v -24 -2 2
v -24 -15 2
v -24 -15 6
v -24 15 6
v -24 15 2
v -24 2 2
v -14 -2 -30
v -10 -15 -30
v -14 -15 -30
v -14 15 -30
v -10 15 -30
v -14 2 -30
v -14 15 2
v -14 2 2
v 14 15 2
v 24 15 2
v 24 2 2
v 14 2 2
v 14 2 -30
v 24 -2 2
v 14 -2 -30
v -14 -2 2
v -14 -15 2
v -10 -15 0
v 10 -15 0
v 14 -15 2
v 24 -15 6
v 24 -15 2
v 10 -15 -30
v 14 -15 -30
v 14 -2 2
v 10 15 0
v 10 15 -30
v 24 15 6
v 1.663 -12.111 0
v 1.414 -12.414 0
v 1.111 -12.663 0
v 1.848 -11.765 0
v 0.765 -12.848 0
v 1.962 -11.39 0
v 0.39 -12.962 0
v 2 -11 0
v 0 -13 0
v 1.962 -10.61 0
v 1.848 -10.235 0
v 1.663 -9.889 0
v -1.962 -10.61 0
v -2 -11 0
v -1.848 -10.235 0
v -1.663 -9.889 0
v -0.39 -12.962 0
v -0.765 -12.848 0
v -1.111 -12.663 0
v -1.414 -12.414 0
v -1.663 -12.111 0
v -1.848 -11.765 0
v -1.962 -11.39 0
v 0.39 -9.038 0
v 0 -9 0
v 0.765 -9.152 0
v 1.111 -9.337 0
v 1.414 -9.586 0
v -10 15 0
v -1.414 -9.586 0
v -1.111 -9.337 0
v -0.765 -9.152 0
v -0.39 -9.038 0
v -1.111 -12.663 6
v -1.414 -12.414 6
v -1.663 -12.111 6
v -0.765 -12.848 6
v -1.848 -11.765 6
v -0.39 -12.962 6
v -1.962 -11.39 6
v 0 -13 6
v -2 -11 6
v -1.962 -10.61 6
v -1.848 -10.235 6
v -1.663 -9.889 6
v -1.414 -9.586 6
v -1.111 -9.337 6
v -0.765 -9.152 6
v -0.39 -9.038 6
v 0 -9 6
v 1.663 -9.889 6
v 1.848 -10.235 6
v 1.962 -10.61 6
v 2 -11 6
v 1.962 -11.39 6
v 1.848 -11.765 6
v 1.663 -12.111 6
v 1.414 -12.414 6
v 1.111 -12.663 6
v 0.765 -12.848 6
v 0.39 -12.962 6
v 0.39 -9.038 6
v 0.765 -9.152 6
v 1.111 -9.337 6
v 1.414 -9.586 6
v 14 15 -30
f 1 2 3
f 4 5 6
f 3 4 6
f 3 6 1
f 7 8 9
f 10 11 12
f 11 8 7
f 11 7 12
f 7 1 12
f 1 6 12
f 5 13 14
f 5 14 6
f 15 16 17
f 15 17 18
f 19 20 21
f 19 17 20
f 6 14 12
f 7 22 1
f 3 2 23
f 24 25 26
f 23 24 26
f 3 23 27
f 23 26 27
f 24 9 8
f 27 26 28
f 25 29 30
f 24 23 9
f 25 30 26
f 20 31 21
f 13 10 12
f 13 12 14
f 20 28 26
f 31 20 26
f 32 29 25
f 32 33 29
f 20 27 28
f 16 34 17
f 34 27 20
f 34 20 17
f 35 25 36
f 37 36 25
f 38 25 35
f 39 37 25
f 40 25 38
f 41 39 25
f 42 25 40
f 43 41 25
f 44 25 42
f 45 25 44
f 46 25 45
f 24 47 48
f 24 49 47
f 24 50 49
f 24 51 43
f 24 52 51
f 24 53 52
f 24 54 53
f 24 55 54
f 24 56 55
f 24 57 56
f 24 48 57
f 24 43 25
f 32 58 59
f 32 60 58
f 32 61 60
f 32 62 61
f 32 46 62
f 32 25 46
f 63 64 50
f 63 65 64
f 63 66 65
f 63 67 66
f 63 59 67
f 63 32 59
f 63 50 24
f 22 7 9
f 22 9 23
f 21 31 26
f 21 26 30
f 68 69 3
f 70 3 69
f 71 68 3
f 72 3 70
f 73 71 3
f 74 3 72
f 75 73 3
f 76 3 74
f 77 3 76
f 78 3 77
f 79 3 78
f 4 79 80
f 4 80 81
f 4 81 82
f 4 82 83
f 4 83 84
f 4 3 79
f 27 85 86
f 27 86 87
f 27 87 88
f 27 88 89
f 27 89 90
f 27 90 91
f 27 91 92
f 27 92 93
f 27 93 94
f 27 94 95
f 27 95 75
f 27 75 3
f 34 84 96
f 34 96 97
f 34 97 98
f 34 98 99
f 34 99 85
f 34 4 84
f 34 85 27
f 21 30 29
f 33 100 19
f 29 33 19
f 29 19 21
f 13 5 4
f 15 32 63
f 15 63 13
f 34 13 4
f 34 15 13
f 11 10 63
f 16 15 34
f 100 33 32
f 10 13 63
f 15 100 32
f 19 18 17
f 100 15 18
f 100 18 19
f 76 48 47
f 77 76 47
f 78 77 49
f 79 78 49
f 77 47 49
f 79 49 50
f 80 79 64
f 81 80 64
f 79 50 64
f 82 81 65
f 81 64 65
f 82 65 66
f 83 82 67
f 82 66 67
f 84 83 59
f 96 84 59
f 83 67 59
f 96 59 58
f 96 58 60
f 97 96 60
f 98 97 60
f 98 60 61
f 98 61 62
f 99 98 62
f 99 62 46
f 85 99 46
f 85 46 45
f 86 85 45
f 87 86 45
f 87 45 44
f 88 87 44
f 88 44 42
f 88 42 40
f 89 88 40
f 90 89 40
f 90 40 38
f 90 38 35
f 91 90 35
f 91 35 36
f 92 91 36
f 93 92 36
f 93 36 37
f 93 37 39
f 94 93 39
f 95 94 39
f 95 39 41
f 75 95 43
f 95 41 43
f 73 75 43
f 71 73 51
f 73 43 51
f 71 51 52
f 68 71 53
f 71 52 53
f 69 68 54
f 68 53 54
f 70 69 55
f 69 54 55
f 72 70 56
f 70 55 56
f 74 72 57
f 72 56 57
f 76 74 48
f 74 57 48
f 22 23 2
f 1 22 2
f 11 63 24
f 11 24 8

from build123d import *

# Parameters (mm, degrees)
BOSS_EXTRUDE1_DEPTH = 15
BOSS_EXTRUDE2_DEPTH = 2
SKETCH3_R           = 2
CUT_EXTRUDE1_DEPTH  = 42.243181255


with BuildPart() as part:
    # Sketch1 → Boss-Extrude1 (new, symmetric)
    with BuildSketch(Plane(origin=(0, 0, 0), x_dir=(1, 0, 0), z_dir=(0, 1, 0))):
        Polygon((10, 0), (-10, 0), (-10, 30), (-14, 30), (-14, -2), (-24, -2), (-24, -6), (24, -6), (24, -2), (14, -2), (14, 30), (10, 30), align=None)
    extrude(amount=BOSS_EXTRUDE1_DEPTH, both=True)

    # Sketch2 → Boss-Extrude2 (add, symmetric)
    with BuildSketch(Plane(origin=(0, 0, 0), x_dir=(1, 0, 0), z_dir=(0, 1, 0))):
        Polygon((14, 30), (14, -2), (24, -2), align=None)
    boss_extrude2 = extrude(amount=BOSS_EXTRUDE2_DEPTH, both=True)

    # Mirror1: Boss-Extrude2 across plane
    add(boss_extrude2.mirror(Plane(origin=(0, 0, 0), x_dir=(0, 0, 1), z_dir=(1, 0, 0))))

    # Sketch3 → Cut-Extrude1 (cut, through all)
    with BuildSketch(Plane(origin=(0, 0, 0), x_dir=(-1, 0, 0), z_dir=(0, 0, -1))):
        with Locations((0, -11)):
            Circle(SKETCH3_R)
    extrude(amount=-CUT_EXTRUDE1_DEPTH, mode=Mode.SUBTRACT)


solid = part.part
